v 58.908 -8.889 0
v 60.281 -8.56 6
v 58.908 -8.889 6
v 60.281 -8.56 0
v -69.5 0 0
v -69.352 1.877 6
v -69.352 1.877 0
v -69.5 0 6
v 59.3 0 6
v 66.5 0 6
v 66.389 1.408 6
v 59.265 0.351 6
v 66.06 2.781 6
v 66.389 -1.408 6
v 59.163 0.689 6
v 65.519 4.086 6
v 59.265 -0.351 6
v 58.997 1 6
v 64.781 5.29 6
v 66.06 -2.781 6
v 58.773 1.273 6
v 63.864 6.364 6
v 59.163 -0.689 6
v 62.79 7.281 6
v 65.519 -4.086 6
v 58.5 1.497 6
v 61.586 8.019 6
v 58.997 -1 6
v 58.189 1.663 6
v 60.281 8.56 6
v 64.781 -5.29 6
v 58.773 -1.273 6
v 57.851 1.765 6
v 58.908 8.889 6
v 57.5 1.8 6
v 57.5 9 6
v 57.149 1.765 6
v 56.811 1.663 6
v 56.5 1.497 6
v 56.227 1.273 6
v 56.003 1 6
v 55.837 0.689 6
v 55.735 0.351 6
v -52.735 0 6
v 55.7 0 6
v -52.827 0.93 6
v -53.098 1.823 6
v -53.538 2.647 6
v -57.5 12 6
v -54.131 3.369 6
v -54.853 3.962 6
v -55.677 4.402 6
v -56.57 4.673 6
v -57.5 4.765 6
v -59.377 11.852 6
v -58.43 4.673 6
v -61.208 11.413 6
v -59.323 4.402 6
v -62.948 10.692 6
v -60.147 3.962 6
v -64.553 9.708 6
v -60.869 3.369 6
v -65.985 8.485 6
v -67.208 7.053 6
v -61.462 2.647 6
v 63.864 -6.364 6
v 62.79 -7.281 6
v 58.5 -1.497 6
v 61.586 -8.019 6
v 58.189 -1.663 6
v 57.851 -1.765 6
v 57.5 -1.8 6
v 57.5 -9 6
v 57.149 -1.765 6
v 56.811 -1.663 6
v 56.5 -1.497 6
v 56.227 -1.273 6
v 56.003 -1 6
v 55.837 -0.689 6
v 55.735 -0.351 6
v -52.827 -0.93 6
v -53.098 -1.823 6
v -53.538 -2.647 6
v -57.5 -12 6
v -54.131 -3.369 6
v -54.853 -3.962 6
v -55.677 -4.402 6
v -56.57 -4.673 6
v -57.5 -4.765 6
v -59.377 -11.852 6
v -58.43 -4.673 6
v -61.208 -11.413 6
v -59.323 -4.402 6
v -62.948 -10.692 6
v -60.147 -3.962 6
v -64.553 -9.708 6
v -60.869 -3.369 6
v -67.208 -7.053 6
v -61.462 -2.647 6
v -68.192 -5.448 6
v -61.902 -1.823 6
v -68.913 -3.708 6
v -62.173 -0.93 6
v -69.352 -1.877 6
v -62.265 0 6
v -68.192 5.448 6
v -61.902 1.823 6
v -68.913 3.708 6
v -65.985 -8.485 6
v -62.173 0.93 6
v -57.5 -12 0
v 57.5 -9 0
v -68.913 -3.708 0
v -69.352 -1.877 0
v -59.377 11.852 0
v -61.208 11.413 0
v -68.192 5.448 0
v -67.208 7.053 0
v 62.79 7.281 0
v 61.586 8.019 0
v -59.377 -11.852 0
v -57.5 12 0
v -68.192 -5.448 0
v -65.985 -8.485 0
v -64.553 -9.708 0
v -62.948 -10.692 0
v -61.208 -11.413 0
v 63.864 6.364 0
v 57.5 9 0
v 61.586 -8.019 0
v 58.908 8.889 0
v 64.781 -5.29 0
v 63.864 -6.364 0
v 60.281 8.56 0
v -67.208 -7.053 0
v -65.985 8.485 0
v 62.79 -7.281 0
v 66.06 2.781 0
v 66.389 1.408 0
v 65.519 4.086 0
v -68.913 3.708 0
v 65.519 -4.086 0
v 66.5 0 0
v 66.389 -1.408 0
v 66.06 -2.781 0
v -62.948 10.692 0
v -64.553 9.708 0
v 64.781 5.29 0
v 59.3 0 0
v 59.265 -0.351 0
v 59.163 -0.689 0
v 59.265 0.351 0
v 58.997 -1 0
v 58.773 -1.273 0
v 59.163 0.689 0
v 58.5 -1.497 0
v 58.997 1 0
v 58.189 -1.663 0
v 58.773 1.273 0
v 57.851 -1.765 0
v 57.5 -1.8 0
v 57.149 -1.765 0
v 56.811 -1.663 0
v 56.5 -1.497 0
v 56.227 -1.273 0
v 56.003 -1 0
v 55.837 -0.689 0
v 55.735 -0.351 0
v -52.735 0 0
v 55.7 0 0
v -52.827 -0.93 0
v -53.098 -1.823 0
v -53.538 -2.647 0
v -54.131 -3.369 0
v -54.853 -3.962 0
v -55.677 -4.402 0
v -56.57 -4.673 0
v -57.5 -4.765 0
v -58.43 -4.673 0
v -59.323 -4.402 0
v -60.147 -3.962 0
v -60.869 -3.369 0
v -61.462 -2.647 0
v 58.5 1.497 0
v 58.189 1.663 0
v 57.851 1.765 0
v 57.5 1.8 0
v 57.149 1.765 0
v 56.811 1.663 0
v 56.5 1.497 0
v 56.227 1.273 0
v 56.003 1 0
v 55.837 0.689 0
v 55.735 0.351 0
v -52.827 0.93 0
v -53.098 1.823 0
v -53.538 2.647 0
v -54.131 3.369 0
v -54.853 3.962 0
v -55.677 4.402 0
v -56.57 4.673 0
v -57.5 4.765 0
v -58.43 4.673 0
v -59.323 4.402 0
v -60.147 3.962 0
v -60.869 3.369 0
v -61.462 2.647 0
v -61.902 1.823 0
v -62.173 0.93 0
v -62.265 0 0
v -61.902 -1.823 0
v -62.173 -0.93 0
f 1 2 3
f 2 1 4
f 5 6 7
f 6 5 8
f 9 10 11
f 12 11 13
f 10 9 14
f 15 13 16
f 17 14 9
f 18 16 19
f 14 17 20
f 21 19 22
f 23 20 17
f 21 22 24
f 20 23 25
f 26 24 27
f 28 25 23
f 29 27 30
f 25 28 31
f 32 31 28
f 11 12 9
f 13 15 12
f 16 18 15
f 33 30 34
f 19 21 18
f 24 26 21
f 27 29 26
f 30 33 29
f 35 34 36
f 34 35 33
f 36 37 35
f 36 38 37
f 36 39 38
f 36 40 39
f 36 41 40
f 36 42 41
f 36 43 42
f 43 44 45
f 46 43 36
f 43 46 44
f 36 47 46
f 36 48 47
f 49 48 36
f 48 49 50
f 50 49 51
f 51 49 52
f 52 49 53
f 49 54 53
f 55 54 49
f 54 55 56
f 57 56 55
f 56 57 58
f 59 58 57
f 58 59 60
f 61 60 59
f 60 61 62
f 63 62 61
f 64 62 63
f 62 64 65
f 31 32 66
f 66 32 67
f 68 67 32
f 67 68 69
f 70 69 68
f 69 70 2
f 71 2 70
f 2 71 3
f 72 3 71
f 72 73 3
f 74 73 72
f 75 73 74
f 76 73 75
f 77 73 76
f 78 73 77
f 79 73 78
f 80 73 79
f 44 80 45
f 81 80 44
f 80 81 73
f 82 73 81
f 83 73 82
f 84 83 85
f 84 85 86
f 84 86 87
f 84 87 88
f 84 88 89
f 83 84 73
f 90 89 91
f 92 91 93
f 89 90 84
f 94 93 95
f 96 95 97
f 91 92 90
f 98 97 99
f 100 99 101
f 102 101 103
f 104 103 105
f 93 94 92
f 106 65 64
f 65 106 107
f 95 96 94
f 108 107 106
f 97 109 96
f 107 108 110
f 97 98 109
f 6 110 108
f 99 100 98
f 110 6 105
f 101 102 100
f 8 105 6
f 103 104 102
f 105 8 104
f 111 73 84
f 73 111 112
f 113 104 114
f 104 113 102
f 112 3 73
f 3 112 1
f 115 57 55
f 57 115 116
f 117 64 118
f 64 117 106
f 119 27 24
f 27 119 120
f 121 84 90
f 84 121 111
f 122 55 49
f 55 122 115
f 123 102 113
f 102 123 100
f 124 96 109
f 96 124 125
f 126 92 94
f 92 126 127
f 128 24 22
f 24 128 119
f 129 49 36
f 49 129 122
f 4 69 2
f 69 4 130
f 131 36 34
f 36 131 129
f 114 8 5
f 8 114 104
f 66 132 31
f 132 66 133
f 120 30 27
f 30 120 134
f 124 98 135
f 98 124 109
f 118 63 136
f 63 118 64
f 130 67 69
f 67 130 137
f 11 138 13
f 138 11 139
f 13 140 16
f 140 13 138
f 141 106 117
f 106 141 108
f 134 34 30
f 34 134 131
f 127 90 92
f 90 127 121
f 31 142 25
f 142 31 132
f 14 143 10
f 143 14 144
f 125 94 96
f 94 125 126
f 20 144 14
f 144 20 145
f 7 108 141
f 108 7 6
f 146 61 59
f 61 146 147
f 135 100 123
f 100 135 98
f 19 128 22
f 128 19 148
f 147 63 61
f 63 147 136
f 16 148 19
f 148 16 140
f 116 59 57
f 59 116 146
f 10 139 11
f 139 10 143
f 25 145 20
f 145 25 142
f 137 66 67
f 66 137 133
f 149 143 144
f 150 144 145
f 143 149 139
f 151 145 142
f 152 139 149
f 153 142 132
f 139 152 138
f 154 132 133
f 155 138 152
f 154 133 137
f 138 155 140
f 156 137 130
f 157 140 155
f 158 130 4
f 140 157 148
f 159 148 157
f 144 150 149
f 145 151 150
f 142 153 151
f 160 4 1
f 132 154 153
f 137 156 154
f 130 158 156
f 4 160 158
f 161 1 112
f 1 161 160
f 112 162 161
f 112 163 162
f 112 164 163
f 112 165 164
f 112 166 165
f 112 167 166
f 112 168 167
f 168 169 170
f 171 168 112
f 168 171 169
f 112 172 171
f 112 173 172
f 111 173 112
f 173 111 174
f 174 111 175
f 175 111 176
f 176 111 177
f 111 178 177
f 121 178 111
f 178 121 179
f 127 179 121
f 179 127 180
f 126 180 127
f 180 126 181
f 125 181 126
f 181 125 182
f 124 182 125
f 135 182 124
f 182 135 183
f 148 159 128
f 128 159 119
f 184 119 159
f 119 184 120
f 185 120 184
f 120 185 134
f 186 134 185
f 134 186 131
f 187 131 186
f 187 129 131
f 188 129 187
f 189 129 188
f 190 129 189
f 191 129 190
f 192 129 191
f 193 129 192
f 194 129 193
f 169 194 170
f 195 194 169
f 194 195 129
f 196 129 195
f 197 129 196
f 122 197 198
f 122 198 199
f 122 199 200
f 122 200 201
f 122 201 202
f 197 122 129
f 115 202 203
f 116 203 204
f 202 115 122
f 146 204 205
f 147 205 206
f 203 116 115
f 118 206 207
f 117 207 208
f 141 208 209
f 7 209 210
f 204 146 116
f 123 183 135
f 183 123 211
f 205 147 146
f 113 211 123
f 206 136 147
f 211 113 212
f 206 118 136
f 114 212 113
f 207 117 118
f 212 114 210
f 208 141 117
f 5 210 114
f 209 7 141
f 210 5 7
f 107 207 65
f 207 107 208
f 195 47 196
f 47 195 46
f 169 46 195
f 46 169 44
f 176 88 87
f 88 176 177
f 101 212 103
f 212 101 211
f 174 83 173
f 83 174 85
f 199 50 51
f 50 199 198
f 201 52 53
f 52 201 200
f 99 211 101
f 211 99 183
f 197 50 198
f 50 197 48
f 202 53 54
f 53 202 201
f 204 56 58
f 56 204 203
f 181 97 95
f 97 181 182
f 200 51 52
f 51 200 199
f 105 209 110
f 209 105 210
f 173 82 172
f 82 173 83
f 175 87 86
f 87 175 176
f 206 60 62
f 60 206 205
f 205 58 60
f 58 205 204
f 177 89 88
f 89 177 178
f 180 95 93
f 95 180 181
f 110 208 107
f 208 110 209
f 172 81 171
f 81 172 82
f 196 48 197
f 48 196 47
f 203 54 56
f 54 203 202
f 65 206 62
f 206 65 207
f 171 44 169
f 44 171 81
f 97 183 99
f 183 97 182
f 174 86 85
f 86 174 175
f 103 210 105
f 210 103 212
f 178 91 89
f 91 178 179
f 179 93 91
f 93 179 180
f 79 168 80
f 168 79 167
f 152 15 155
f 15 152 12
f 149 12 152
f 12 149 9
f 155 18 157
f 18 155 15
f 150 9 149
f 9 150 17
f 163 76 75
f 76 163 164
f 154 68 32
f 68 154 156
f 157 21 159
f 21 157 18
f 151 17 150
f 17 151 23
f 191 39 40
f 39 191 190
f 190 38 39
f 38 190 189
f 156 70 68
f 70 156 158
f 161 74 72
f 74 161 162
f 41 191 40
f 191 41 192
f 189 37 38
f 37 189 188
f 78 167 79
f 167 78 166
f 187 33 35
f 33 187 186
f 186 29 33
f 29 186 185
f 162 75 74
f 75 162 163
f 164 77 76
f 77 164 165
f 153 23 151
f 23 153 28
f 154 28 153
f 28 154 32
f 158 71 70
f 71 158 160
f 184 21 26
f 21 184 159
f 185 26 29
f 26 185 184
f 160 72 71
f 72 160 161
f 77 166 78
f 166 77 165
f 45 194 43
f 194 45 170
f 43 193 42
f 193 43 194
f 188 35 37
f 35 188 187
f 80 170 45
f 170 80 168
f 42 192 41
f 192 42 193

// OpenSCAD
$fn = 32;

// ----------------------------------------------------------------------
// Lever: 115 mm between the bosses, 6 mm thick, smooth outline
// ----------------------------------------------------------------------

// --- parameters (mm) ---
lever_l = 115;            // distance between the boss centres
boss_a = 24;              // first boss diameter
boss_b = 18;              // second boss diameter
bore_a = 9.53;            // first bore
bore_b = 3.6;             // second bore
lever_t = 6;              // lever thickness

lever_profile = [[-69.5, 0], [-69.352, -1.877], [-68.913, -3.708], [-68.192, -5.448], [-67.208, -7.053], [-65.985, -8.485], [-64.553, -9.708], [-62.948, -10.692], [-61.208, -11.413], [-59.377, -11.852], [-57.5, -12], [57.5, -9], [58.908, -8.889], [60.281, -8.56], [61.586, -8.019], [62.79, -7.281], [63.864, -6.364], [64.781, -5.29], [65.519, -4.086], [66.06, -2.781], [66.389, -1.408], [66.5, 0], [66.389, 1.408], [66.06, 2.781], [65.519, 4.086], [64.781, 5.29], [63.864, 6.364], [62.79, 7.281], [61.586, 8.019], [60.281, 8.56], [58.908, 8.889], [57.5, 9], [-57.5, 12], [-59.377, 11.852], [-61.208, 11.413], [-62.948, 10.692], [-64.553, 9.708], [-65.985, 8.485], [-67.208, 7.053], [-68.192, 5.448], [-68.913, 3.708], [-69.352, 1.877]];

difference() {
  linear_extrude(height = lever_t) polygon(lever_profile);
  translate([-57.5, 0, -2.5]) cylinder(h = lever_t + 5, d = bore_a);
  translate([57.5, 0, -2.5]) cylinder(h = lever_t + 5, d = bore_b);
}
